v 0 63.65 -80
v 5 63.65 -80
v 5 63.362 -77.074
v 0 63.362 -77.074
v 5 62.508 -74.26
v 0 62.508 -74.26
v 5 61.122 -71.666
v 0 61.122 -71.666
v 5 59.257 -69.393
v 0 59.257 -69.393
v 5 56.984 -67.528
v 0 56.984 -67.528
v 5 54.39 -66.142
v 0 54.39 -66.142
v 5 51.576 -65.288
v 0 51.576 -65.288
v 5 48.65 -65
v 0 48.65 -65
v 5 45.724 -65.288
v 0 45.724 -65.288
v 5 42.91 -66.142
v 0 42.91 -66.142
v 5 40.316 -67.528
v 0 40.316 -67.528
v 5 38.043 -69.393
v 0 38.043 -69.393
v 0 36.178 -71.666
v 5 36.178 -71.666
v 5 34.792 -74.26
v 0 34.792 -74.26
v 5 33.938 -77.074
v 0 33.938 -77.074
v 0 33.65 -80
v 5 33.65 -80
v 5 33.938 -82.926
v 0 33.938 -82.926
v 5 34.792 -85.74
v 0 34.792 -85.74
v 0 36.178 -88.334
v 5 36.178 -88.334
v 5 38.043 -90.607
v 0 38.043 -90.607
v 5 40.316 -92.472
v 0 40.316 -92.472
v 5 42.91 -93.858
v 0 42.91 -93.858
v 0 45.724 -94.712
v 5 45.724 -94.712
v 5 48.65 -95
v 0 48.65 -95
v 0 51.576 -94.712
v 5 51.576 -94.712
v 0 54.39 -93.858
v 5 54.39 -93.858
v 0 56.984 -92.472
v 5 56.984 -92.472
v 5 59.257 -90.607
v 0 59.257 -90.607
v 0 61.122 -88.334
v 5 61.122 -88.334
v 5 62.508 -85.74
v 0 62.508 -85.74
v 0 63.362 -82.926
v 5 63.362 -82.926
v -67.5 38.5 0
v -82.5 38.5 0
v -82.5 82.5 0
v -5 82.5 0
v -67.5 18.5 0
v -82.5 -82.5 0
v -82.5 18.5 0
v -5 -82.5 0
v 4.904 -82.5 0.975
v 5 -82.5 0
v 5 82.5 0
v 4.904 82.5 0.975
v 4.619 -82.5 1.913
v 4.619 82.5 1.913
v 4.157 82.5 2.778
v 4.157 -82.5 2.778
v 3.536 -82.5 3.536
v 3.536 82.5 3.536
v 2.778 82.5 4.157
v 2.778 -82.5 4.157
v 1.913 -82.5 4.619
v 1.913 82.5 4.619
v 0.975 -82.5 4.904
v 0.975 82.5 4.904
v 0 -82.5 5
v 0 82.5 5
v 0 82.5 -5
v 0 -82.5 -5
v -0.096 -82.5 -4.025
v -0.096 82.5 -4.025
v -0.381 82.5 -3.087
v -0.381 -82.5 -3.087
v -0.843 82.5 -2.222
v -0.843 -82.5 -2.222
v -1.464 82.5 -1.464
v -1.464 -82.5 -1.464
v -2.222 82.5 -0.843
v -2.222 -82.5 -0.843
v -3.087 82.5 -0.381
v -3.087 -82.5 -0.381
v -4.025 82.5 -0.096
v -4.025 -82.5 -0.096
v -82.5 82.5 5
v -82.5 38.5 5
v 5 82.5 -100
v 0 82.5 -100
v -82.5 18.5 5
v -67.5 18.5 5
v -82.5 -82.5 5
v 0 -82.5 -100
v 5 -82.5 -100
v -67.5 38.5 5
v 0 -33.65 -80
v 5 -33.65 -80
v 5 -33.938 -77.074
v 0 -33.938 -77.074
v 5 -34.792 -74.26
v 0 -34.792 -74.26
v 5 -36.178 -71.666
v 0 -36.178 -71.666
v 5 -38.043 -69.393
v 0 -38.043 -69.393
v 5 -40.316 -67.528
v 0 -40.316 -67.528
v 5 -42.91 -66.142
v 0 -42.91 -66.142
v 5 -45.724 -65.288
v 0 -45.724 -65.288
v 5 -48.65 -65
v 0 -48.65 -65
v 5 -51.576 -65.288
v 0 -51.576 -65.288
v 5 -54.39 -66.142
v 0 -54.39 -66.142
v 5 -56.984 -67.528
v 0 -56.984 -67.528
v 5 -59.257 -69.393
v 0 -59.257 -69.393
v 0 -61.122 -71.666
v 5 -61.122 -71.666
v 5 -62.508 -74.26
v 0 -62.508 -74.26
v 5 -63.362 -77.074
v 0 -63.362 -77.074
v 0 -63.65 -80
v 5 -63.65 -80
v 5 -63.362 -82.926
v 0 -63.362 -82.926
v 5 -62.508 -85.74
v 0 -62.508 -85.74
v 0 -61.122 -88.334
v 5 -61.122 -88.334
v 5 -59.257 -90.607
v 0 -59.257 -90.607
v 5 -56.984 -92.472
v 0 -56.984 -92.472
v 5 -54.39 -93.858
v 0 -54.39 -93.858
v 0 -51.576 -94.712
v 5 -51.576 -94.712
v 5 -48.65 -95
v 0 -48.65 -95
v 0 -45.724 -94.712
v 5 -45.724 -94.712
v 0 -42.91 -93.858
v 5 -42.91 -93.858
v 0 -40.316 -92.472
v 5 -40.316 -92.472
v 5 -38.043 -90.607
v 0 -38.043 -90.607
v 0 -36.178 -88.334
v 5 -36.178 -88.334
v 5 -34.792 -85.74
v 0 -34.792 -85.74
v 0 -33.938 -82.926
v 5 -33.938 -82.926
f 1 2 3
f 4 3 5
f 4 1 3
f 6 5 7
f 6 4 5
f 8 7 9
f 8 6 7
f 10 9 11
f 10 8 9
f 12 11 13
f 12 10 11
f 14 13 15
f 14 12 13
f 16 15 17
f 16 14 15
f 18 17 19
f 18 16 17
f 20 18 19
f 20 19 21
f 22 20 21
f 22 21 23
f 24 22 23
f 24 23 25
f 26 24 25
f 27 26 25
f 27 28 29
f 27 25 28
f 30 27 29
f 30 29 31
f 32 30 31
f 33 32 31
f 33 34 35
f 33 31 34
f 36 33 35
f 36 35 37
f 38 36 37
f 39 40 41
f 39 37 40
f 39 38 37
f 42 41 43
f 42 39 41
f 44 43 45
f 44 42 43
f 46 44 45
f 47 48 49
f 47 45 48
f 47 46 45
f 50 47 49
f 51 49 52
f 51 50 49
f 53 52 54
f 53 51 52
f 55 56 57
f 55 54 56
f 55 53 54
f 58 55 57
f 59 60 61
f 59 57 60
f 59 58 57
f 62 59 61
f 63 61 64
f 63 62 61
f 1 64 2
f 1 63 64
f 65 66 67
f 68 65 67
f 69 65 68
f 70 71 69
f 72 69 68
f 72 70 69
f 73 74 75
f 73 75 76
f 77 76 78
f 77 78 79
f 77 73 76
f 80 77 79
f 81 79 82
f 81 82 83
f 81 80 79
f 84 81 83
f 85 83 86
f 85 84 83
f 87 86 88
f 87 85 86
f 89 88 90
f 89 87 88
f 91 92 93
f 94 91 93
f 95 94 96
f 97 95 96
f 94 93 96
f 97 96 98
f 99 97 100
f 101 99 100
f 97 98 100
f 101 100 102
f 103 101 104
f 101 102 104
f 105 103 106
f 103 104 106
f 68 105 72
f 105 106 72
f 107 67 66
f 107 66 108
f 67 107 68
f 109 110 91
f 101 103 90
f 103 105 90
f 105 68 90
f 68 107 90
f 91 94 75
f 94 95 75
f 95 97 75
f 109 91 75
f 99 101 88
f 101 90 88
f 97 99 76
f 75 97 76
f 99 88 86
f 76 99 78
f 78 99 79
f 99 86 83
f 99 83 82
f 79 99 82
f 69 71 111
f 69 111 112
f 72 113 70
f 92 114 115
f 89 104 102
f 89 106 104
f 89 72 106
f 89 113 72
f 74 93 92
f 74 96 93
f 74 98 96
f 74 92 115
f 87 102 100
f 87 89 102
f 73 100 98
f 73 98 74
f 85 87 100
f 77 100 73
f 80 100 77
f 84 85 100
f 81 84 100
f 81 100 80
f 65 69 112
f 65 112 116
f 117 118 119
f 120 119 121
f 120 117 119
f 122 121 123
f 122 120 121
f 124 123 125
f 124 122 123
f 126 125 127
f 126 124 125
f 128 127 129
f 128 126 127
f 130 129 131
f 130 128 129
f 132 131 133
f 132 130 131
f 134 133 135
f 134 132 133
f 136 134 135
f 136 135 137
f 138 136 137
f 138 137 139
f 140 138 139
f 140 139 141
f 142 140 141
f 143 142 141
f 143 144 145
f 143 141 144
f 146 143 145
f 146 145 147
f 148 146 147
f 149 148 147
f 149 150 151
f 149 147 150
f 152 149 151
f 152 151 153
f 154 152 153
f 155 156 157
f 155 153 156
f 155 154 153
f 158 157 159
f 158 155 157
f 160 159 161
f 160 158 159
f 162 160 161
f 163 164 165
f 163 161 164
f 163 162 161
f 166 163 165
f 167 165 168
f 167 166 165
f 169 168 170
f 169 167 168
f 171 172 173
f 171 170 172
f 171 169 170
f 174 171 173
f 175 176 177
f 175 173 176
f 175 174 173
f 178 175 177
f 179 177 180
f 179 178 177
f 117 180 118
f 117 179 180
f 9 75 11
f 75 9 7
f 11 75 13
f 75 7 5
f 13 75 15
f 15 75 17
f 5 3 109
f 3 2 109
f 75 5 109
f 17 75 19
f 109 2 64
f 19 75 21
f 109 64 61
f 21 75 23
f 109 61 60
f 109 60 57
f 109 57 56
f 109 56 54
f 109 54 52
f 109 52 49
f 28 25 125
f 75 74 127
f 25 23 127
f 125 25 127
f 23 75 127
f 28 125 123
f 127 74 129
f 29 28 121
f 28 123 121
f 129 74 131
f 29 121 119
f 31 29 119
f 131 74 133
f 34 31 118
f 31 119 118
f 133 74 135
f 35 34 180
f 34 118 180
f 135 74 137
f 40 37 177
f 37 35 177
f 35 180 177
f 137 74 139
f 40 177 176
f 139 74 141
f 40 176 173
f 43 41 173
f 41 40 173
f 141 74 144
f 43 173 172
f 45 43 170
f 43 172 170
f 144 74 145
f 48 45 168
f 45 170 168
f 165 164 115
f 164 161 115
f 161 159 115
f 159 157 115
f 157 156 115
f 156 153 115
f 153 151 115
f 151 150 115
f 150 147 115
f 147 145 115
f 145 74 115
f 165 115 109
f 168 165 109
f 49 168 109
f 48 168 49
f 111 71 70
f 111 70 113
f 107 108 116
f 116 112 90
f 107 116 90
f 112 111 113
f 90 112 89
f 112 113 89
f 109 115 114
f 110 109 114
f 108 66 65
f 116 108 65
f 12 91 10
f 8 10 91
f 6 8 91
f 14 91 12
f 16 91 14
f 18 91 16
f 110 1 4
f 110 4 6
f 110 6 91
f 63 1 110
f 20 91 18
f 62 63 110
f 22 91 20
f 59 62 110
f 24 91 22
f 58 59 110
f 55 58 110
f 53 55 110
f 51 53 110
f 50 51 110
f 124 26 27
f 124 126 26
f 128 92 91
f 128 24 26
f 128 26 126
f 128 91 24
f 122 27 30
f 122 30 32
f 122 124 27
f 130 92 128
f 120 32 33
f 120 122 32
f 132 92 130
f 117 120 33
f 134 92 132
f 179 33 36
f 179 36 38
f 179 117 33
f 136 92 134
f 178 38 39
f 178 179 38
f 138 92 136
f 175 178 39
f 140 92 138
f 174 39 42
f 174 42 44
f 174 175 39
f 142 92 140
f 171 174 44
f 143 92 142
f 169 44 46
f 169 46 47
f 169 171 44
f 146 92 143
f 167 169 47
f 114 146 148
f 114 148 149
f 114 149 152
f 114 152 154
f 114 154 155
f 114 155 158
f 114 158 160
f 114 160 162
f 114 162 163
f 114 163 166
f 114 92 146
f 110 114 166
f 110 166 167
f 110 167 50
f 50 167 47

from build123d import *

# Parameters (mm, degrees)
PAD_DEPTH            = 82.5
SKETCH001_W          = 25
SKETCH001_H          = 20
POCKET_DEPTH         = 100.001
POCKET_DEPTH_BACK    = -5.001
SKETCH002_R          = 15
POCKET001_DEPTH      = 82.501
POCKET001_DEPTH_BACK = -5.001


with BuildPart() as part:
    # Sketch → Pad (new body, symmetric)
    with BuildSketch(Plane.XZ):
        with BuildLine():
            Line((-82.5, 0), (-5, 0))
            ThreePointArc((0, -5), (-1.464466, -1.464466), (-5, 0))
            Line((0, -5), (0, -100))
            Line((5, -100), (0, -100))
            Line((5, 0), (5, -100))
            ThreePointArc((5, 0), (3.535534, 3.535534), (0, 5))
            Line((-82.5, 5), (0, 5))
            Line((-82.5, 0), (-82.5, 5))
        make_face()
    extrude(amount=PAD_DEPTH, both=True)

    # Sketch001 → Pocket (cut, two sides)
    with BuildSketch(Plane.XY) as pocket_sk:
        with Locations((-80, 28.5)):
            Rectangle(SKETCH001_W, SKETCH001_H)
    extrude(amount=-POCKET_DEPTH, mode=Mode.SUBTRACT)
    extrude(pocket_sk.sketch, amount=-POCKET_DEPTH_BACK, mode=Mode.SUBTRACT)

    # Sketch002 → Pocket001 (cut, two sides)
    with BuildSketch(Plane.YZ) as pocket001_sk:
        with Locations((-48.65, -80)):
            Circle(SKETCH002_R)
        with Locations((48.65, -80)):
            Circle(SKETCH002_R)
    extrude(amount=-POCKET001_DEPTH, mode=Mode.SUBTRACT)
    extrude(pocket001_sk.sketch, amount=-POCKET001_DEPTH_BACK, mode=Mode.SUBTRACT)


solid = part.part
